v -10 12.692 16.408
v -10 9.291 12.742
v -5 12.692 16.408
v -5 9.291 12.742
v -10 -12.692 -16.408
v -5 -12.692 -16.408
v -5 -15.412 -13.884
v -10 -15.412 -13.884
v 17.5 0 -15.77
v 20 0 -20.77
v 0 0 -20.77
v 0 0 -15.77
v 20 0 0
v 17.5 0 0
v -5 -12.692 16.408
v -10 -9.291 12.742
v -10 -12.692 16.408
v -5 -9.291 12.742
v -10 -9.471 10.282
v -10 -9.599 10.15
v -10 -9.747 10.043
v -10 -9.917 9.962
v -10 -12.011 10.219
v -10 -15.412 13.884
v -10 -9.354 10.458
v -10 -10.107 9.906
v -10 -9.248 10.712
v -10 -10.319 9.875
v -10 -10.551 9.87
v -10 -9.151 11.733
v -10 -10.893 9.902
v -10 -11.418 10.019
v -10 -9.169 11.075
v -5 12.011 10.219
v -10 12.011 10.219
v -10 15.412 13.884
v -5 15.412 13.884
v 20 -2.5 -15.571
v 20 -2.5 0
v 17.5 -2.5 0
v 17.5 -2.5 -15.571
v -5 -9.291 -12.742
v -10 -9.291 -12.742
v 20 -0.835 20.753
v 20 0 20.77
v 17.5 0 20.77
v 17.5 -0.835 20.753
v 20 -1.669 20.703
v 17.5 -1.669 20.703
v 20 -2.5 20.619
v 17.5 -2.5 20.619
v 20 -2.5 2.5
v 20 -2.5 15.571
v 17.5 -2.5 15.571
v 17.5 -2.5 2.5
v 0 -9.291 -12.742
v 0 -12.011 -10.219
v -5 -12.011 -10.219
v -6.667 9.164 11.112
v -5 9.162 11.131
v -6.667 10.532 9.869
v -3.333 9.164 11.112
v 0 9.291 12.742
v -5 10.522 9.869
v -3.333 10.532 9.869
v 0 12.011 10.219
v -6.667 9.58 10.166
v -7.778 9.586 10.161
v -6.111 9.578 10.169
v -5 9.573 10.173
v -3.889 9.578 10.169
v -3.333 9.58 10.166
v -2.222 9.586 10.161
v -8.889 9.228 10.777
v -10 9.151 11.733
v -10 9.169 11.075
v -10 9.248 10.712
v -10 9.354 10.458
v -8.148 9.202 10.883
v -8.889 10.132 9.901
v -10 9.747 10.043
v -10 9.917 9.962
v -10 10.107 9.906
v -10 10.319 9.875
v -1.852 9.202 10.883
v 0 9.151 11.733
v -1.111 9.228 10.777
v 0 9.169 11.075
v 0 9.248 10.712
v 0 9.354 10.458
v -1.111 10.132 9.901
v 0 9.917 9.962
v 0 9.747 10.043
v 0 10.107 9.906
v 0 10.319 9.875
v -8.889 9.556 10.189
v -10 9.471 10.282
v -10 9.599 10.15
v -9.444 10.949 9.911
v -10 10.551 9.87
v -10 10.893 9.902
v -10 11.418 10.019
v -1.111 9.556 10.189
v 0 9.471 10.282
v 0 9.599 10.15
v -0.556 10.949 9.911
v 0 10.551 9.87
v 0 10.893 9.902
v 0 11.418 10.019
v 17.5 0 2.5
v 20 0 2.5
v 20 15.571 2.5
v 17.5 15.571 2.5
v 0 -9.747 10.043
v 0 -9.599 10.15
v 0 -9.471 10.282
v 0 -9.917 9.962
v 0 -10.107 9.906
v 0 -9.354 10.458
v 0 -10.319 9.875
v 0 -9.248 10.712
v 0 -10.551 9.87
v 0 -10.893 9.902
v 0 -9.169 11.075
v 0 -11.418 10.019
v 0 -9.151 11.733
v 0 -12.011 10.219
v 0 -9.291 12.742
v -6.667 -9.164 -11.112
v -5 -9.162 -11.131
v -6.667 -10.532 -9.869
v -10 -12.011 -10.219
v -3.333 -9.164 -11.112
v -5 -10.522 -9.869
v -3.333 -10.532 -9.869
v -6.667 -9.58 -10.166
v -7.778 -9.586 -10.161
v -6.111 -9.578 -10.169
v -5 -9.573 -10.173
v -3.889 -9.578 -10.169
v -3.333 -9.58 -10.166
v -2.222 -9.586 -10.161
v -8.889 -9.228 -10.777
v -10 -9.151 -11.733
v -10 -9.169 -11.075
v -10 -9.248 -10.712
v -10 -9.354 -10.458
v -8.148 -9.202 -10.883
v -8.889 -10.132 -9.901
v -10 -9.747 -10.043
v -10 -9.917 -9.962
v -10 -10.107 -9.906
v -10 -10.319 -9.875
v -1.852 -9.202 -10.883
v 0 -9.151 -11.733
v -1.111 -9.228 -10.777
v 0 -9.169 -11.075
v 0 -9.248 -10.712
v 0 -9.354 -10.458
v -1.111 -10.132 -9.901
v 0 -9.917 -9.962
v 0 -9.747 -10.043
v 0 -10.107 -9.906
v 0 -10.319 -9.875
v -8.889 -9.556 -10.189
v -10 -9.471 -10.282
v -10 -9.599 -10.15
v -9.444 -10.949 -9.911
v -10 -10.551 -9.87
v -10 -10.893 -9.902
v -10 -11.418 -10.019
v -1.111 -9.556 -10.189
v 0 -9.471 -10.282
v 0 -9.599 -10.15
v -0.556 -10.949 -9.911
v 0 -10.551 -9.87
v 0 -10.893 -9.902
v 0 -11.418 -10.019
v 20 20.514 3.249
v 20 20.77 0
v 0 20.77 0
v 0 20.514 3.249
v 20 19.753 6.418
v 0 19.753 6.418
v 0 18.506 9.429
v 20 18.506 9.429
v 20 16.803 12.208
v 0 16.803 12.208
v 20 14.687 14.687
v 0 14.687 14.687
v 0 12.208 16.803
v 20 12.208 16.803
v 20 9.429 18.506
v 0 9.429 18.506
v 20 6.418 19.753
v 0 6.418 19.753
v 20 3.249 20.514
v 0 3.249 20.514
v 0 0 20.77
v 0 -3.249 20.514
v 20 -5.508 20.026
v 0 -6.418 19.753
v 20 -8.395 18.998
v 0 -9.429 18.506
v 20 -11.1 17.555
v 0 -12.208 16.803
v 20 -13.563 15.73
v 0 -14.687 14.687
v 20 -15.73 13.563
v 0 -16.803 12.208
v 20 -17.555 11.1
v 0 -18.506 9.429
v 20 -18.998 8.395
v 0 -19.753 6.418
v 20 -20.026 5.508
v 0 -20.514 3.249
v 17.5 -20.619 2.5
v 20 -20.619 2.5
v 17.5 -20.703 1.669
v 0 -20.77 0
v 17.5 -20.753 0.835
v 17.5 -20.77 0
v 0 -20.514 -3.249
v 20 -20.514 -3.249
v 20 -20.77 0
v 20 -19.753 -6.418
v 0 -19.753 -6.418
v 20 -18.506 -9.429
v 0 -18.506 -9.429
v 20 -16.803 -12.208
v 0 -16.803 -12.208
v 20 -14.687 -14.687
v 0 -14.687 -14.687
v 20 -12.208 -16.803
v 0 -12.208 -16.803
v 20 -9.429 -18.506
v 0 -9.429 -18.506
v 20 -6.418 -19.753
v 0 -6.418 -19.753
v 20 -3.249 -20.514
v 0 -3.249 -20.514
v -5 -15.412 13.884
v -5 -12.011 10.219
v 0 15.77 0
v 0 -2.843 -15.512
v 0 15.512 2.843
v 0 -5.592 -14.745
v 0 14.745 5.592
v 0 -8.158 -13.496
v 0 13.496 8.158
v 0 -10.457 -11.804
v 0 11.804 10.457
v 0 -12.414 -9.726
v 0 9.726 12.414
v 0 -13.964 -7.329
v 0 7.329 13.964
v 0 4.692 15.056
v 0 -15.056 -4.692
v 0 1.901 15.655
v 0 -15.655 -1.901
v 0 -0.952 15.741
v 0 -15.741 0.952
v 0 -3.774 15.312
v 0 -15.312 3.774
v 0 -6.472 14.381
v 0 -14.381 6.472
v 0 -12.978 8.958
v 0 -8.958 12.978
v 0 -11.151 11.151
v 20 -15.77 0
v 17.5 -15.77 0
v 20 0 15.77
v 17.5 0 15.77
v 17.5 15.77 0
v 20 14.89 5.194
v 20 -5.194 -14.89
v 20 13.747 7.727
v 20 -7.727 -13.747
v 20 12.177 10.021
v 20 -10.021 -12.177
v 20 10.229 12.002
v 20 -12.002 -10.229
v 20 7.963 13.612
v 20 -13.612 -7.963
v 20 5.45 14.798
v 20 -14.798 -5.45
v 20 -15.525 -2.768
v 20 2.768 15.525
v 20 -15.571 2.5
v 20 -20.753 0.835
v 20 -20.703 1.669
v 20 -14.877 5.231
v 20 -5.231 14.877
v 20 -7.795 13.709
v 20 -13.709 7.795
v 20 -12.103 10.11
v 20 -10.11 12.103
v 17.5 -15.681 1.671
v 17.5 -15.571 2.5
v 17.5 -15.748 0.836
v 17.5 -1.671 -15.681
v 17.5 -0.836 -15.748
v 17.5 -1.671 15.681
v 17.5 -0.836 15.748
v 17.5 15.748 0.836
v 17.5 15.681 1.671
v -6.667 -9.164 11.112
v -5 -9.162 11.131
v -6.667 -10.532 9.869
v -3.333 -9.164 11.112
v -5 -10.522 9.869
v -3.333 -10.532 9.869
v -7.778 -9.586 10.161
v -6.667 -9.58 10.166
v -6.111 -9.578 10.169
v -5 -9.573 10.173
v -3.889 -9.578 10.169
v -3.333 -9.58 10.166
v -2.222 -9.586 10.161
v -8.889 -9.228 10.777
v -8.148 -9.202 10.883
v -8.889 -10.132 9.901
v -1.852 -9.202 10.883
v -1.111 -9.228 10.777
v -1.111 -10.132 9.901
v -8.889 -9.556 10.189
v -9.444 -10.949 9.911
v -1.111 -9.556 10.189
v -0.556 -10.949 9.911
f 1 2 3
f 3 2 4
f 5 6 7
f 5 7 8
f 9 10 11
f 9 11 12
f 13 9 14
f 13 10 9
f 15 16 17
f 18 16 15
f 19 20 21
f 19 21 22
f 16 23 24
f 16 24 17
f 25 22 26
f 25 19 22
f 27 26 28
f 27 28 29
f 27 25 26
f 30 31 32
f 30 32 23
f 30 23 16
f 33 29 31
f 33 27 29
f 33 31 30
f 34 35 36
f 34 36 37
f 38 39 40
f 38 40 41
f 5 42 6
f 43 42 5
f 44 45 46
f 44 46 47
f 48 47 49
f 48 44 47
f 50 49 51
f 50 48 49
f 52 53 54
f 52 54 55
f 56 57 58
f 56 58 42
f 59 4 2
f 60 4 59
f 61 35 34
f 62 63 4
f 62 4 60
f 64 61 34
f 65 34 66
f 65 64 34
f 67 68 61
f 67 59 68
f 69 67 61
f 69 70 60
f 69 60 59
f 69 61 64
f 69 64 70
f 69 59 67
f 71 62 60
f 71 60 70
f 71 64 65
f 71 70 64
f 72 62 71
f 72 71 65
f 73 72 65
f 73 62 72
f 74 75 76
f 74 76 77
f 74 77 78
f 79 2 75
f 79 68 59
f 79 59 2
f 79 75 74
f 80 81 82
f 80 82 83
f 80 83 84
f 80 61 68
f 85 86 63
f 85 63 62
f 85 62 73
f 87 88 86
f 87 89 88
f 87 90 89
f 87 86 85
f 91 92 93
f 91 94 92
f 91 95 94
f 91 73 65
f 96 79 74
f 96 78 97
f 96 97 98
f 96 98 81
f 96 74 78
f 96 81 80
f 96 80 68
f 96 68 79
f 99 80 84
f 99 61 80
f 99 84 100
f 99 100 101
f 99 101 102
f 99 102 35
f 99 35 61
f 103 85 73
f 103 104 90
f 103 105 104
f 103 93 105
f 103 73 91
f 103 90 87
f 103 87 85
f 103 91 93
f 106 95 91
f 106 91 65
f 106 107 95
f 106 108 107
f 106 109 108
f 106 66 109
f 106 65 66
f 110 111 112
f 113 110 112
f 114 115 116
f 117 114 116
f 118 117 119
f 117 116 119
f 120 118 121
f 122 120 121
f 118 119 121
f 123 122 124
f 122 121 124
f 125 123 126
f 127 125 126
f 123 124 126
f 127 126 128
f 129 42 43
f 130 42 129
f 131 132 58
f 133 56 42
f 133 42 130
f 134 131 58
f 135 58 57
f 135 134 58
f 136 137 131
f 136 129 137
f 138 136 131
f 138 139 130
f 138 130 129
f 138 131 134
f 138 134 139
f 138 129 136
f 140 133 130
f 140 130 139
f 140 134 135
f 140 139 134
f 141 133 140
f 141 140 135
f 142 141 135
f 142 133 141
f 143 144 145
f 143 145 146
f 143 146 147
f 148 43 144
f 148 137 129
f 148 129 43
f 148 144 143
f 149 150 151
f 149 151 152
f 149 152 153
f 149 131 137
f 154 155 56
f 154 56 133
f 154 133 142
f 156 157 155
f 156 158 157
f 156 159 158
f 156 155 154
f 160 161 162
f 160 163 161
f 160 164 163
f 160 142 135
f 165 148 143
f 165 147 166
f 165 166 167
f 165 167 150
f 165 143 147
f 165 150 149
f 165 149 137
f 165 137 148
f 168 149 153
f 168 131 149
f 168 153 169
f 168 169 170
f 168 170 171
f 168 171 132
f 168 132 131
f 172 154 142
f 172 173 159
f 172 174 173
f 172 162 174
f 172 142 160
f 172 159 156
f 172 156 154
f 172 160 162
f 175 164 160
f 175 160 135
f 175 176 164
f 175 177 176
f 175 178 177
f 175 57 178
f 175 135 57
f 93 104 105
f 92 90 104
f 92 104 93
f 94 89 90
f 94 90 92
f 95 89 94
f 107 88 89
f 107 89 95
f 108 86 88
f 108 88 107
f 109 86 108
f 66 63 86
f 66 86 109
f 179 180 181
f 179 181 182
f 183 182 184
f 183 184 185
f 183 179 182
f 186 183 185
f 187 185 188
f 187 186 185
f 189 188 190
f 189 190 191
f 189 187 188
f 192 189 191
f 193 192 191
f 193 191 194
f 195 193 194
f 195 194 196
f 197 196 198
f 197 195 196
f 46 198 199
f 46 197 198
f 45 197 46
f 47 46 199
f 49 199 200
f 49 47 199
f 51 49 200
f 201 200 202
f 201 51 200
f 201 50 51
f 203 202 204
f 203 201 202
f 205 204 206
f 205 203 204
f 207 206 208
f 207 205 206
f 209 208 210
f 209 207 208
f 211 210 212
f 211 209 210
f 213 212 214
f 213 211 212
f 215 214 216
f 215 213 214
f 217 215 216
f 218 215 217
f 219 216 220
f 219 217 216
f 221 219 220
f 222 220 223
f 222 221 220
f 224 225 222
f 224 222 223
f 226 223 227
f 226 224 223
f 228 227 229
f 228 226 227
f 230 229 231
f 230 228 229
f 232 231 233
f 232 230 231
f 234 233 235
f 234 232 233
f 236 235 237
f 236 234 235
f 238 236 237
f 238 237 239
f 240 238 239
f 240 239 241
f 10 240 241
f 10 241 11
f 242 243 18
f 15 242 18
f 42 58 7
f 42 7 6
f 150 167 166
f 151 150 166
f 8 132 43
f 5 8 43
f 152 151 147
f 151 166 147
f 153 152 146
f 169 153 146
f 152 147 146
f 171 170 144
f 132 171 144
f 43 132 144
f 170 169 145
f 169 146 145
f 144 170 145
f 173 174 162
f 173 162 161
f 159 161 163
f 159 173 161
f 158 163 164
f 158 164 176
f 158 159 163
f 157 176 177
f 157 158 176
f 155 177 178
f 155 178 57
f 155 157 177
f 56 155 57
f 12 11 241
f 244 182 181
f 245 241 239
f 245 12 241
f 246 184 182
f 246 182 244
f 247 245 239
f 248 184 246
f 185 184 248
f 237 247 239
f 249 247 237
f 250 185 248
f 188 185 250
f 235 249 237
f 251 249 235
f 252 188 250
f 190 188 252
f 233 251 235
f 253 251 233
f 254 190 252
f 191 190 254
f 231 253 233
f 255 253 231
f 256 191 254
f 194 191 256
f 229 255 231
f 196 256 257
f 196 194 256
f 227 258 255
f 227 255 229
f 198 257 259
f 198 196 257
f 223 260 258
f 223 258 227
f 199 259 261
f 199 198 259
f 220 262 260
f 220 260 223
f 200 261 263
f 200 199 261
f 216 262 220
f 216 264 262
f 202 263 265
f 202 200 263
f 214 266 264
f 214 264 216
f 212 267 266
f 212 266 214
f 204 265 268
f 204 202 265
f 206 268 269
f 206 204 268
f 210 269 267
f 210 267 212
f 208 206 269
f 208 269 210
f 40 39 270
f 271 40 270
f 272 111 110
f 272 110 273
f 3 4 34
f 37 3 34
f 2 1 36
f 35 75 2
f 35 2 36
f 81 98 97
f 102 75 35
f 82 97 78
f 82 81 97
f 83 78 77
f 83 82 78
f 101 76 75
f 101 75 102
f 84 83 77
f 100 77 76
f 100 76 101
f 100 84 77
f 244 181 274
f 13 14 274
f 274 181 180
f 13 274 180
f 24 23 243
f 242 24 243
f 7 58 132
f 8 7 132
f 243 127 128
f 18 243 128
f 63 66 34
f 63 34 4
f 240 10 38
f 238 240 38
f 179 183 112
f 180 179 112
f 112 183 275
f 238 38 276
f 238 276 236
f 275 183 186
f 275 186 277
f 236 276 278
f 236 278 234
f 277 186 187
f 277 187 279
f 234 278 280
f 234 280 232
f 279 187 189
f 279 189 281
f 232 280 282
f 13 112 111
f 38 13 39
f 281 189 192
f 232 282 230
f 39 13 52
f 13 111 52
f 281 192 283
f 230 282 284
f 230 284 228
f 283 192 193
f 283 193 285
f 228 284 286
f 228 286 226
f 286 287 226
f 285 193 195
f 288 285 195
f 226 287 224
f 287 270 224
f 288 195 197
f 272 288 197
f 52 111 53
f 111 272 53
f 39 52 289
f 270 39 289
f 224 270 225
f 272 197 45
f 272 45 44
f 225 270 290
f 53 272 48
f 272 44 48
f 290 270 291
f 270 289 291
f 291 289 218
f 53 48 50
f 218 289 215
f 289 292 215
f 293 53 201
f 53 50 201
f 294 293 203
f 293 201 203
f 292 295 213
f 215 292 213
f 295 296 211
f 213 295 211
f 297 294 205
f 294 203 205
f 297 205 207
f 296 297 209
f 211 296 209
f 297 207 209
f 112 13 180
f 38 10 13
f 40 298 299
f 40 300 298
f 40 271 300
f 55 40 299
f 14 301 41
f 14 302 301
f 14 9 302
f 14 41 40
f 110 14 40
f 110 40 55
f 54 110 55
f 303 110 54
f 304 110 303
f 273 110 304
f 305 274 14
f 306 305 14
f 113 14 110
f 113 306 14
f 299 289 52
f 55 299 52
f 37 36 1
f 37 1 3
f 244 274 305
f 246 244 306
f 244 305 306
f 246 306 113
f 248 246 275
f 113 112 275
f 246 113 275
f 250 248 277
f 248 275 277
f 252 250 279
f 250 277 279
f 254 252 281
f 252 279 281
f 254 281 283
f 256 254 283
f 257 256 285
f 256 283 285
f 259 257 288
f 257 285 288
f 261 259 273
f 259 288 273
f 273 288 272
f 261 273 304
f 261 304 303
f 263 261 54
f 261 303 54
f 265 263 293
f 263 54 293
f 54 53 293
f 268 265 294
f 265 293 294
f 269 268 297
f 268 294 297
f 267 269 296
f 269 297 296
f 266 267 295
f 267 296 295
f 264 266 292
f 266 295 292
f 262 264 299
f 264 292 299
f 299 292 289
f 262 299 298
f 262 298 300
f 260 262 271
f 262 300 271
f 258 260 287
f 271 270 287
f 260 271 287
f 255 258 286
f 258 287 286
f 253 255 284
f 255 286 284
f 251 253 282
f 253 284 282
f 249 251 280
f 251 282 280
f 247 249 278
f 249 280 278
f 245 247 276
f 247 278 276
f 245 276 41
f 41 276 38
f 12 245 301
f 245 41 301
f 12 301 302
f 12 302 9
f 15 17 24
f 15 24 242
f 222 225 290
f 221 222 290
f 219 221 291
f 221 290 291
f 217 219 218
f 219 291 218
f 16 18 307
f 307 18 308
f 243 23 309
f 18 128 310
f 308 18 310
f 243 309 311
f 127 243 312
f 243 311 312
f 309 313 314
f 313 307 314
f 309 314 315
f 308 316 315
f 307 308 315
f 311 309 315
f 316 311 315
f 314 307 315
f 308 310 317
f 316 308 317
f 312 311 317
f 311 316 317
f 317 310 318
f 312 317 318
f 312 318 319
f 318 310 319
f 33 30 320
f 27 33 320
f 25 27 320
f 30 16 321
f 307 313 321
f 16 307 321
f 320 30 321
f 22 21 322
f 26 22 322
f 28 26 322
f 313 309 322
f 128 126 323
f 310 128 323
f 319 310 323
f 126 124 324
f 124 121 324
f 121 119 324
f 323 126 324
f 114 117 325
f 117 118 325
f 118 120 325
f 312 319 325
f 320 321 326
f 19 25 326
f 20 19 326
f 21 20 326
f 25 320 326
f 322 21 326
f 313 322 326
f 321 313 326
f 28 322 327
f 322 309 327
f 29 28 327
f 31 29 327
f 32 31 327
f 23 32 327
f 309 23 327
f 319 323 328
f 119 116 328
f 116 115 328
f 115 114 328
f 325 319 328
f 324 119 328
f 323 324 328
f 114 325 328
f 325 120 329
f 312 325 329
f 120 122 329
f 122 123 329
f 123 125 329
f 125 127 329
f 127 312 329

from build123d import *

# Parameters (mm, degrees)
SKETCH1_W             = 20
SKETCH1_H             = 5
REVOLVE1_ANGLE        = 270
BOSS_EXTRUDE1_DEPTH   = 2.5
BOSS_EXTRUDE2_DEPTH   = 10
BOSS_EXTRUDE2_2_DEPTH = 10
BOSS_EXTRUDE2_3_DEPTH = 10
SKETCH5_W             = 5
SKETCH5_H             = 3.710509324
BOSS_EXTRUDE3_DEPTH   = 5
SKETCH6_W             = 5
SKETCH6_H             = 3.710509324
BOSS_EXTRUDE4_DEPTH   = 5
SKETCH7_W             = 5
SKETCH7_H             = 3.710509324
BOSS_EXTRUDE5_DEPTH   = 5


with BuildPart() as part:
    # Sketch1 → Revolve1 (revolve)
    with BuildSketch(Plane.XY):
        with Locations((10, 18.27)):
            Rectangle(SKETCH1_W, SKETCH1_H)
    revolve(axis=Axis((-37.288540606, 0, 0), (1, 0, 0)), revolution_arc=REVOLVE1_ANGLE)

    # Sketch2 → Boss-Extrude1 (add)
    with BuildSketch(Plane(origin=(20, 0, 0), x_dir=(0, 0, -1), z_dir=(1, 0, 0))):
        with BuildLine():
            Line((0, 20.77), (0, -20.77))
            ThreePointArc((0, -20.77), (-1.252278215, -20.732214047), (-2.5, -20.618993671))
            Line((-2.5, -20.618993671), (-2.5, 20.618993671))
            ThreePointArc((-2.5, 20.618993671), (-1.252278215, 20.732214047), (0, 20.77))
        make_face()
        with BuildLine():
            Line((20.77, 0), (-20.77, 0))
            ThreePointArc((-20.77, 0), (-20.732214047, -1.252278215), (-20.618993671, -2.5))
            Line((-20.618993671, -2.5), (20.618993671, -2.5))
            ThreePointArc((20.618993671, -2.5), (20.732214047, -1.252278215), (20.77, 0))
        make_face()
    extrude(amount=-BOSS_EXTRUDE1_DEPTH)


with BuildPart() as body_2:
    # Sketch4 → Boss-Extrude2 (new body)
    with BuildSketch(Plane(origin=(0, 0, 0), x_dir=(0, 0, -1), z_dir=(1, 0, 0))):
        with BuildLine():
            add(Edge.make_bspline(
                [(-12.742278752, 9.291244923), (-8.866010194, 8.493718612), (-10.218618517, 12.011358608)],
                knots=[0, 0, 0, 1, 1, 1], degree=2))
            add(Edge.make_bspline(
                [(-10.218618517, 12.011358608), (-12.742278752, 9.291244923)],
                knots=[0, 0, 1, 1], degree=1))
        make_face()
    extrude(amount=-BOSS_EXTRUDE2_DEPTH)

    # Sketch7 → Boss-Extrude5 (add)
    with BuildSketch(Plane(origin=(0, 10.651301765, 11.480448634), x_dir=(1, 0, 0), z_dir=(0, 0.680138497, 0.733083641))):
        with Locations((-7.5, 0)):
            Rectangle(SKETCH7_W, SKETCH7_H)
    extrude(amount=BOSS_EXTRUDE5_DEPTH)


with BuildPart() as body_3:
    # Sketch4 → Boss-Extrude2 2 (new body)
    with BuildSketch(Plane(origin=(0, 0, 0), x_dir=(0, 0, -1), z_dir=(1, 0, 0))):
        with BuildLine():
            add(Edge.make_bspline(
                [(-12.742278752, -9.291244923), (-8.866010194, -8.493718612), (-10.218618517, -12.011358608)],
                knots=[0, 0, 0, 1, 1, 1], degree=2))
            add(Edge.make_bspline(
                [(-10.218618517, -12.011358608), (-12.742278752, -9.291244923)],
                knots=[0, 0, 1, 1], degree=1))
        make_face()
    extrude(amount=-BOSS_EXTRUDE2_2_DEPTH)

    # Sketch6 → Boss-Extrude4 (add)
    with BuildSketch(Plane(origin=(0, -10.651301765, 11.480448634), x_dir=(1, 0, 0), z_dir=(0, -0.680138497, 0.733083641))):
        with Locations((-7.5, 0)):
            Rectangle(SKETCH6_W, SKETCH6_H)
    extrude(amount=BOSS_EXTRUDE4_DEPTH)


with BuildPart() as body_4:
    # Sketch4 → Boss-Extrude2 3 (new body)
    with BuildSketch(Plane(origin=(0, 0, 0), x_dir=(0, 0, -1), z_dir=(1, 0, 0))):
        with BuildLine():
            add(Edge.make_bspline(
                [(12.742278752, -9.291244923), (8.866010194, -8.493718612), (10.218618517, -12.011358608)],
                knots=[0, 0, 0, 1, 1, 1], degree=2))
            add(Edge.make_bspline(
                [(10.218618517, -12.011358608), (12.742278752, -9.291244923)],
                knots=[0, 0, 1, 1], degree=1))
        make_face()
    extrude(amount=-BOSS_EXTRUDE2_3_DEPTH)

    # Sketch5 → Boss-Extrude3 (add)
    with BuildSketch(Plane(origin=(0, -10.651301765, -11.480448634), x_dir=(-1, 0, 0), z_dir=(0, -0.680138497, -0.733083641))):
        with Locations((7.5, 0)):
            Rectangle(SKETCH5_W, SKETCH5_H)
    extrude(amount=BOSS_EXTRUDE3_DEPTH)


solid = Compound([part.part, body_2.part, body_3.part, body_4.part])
